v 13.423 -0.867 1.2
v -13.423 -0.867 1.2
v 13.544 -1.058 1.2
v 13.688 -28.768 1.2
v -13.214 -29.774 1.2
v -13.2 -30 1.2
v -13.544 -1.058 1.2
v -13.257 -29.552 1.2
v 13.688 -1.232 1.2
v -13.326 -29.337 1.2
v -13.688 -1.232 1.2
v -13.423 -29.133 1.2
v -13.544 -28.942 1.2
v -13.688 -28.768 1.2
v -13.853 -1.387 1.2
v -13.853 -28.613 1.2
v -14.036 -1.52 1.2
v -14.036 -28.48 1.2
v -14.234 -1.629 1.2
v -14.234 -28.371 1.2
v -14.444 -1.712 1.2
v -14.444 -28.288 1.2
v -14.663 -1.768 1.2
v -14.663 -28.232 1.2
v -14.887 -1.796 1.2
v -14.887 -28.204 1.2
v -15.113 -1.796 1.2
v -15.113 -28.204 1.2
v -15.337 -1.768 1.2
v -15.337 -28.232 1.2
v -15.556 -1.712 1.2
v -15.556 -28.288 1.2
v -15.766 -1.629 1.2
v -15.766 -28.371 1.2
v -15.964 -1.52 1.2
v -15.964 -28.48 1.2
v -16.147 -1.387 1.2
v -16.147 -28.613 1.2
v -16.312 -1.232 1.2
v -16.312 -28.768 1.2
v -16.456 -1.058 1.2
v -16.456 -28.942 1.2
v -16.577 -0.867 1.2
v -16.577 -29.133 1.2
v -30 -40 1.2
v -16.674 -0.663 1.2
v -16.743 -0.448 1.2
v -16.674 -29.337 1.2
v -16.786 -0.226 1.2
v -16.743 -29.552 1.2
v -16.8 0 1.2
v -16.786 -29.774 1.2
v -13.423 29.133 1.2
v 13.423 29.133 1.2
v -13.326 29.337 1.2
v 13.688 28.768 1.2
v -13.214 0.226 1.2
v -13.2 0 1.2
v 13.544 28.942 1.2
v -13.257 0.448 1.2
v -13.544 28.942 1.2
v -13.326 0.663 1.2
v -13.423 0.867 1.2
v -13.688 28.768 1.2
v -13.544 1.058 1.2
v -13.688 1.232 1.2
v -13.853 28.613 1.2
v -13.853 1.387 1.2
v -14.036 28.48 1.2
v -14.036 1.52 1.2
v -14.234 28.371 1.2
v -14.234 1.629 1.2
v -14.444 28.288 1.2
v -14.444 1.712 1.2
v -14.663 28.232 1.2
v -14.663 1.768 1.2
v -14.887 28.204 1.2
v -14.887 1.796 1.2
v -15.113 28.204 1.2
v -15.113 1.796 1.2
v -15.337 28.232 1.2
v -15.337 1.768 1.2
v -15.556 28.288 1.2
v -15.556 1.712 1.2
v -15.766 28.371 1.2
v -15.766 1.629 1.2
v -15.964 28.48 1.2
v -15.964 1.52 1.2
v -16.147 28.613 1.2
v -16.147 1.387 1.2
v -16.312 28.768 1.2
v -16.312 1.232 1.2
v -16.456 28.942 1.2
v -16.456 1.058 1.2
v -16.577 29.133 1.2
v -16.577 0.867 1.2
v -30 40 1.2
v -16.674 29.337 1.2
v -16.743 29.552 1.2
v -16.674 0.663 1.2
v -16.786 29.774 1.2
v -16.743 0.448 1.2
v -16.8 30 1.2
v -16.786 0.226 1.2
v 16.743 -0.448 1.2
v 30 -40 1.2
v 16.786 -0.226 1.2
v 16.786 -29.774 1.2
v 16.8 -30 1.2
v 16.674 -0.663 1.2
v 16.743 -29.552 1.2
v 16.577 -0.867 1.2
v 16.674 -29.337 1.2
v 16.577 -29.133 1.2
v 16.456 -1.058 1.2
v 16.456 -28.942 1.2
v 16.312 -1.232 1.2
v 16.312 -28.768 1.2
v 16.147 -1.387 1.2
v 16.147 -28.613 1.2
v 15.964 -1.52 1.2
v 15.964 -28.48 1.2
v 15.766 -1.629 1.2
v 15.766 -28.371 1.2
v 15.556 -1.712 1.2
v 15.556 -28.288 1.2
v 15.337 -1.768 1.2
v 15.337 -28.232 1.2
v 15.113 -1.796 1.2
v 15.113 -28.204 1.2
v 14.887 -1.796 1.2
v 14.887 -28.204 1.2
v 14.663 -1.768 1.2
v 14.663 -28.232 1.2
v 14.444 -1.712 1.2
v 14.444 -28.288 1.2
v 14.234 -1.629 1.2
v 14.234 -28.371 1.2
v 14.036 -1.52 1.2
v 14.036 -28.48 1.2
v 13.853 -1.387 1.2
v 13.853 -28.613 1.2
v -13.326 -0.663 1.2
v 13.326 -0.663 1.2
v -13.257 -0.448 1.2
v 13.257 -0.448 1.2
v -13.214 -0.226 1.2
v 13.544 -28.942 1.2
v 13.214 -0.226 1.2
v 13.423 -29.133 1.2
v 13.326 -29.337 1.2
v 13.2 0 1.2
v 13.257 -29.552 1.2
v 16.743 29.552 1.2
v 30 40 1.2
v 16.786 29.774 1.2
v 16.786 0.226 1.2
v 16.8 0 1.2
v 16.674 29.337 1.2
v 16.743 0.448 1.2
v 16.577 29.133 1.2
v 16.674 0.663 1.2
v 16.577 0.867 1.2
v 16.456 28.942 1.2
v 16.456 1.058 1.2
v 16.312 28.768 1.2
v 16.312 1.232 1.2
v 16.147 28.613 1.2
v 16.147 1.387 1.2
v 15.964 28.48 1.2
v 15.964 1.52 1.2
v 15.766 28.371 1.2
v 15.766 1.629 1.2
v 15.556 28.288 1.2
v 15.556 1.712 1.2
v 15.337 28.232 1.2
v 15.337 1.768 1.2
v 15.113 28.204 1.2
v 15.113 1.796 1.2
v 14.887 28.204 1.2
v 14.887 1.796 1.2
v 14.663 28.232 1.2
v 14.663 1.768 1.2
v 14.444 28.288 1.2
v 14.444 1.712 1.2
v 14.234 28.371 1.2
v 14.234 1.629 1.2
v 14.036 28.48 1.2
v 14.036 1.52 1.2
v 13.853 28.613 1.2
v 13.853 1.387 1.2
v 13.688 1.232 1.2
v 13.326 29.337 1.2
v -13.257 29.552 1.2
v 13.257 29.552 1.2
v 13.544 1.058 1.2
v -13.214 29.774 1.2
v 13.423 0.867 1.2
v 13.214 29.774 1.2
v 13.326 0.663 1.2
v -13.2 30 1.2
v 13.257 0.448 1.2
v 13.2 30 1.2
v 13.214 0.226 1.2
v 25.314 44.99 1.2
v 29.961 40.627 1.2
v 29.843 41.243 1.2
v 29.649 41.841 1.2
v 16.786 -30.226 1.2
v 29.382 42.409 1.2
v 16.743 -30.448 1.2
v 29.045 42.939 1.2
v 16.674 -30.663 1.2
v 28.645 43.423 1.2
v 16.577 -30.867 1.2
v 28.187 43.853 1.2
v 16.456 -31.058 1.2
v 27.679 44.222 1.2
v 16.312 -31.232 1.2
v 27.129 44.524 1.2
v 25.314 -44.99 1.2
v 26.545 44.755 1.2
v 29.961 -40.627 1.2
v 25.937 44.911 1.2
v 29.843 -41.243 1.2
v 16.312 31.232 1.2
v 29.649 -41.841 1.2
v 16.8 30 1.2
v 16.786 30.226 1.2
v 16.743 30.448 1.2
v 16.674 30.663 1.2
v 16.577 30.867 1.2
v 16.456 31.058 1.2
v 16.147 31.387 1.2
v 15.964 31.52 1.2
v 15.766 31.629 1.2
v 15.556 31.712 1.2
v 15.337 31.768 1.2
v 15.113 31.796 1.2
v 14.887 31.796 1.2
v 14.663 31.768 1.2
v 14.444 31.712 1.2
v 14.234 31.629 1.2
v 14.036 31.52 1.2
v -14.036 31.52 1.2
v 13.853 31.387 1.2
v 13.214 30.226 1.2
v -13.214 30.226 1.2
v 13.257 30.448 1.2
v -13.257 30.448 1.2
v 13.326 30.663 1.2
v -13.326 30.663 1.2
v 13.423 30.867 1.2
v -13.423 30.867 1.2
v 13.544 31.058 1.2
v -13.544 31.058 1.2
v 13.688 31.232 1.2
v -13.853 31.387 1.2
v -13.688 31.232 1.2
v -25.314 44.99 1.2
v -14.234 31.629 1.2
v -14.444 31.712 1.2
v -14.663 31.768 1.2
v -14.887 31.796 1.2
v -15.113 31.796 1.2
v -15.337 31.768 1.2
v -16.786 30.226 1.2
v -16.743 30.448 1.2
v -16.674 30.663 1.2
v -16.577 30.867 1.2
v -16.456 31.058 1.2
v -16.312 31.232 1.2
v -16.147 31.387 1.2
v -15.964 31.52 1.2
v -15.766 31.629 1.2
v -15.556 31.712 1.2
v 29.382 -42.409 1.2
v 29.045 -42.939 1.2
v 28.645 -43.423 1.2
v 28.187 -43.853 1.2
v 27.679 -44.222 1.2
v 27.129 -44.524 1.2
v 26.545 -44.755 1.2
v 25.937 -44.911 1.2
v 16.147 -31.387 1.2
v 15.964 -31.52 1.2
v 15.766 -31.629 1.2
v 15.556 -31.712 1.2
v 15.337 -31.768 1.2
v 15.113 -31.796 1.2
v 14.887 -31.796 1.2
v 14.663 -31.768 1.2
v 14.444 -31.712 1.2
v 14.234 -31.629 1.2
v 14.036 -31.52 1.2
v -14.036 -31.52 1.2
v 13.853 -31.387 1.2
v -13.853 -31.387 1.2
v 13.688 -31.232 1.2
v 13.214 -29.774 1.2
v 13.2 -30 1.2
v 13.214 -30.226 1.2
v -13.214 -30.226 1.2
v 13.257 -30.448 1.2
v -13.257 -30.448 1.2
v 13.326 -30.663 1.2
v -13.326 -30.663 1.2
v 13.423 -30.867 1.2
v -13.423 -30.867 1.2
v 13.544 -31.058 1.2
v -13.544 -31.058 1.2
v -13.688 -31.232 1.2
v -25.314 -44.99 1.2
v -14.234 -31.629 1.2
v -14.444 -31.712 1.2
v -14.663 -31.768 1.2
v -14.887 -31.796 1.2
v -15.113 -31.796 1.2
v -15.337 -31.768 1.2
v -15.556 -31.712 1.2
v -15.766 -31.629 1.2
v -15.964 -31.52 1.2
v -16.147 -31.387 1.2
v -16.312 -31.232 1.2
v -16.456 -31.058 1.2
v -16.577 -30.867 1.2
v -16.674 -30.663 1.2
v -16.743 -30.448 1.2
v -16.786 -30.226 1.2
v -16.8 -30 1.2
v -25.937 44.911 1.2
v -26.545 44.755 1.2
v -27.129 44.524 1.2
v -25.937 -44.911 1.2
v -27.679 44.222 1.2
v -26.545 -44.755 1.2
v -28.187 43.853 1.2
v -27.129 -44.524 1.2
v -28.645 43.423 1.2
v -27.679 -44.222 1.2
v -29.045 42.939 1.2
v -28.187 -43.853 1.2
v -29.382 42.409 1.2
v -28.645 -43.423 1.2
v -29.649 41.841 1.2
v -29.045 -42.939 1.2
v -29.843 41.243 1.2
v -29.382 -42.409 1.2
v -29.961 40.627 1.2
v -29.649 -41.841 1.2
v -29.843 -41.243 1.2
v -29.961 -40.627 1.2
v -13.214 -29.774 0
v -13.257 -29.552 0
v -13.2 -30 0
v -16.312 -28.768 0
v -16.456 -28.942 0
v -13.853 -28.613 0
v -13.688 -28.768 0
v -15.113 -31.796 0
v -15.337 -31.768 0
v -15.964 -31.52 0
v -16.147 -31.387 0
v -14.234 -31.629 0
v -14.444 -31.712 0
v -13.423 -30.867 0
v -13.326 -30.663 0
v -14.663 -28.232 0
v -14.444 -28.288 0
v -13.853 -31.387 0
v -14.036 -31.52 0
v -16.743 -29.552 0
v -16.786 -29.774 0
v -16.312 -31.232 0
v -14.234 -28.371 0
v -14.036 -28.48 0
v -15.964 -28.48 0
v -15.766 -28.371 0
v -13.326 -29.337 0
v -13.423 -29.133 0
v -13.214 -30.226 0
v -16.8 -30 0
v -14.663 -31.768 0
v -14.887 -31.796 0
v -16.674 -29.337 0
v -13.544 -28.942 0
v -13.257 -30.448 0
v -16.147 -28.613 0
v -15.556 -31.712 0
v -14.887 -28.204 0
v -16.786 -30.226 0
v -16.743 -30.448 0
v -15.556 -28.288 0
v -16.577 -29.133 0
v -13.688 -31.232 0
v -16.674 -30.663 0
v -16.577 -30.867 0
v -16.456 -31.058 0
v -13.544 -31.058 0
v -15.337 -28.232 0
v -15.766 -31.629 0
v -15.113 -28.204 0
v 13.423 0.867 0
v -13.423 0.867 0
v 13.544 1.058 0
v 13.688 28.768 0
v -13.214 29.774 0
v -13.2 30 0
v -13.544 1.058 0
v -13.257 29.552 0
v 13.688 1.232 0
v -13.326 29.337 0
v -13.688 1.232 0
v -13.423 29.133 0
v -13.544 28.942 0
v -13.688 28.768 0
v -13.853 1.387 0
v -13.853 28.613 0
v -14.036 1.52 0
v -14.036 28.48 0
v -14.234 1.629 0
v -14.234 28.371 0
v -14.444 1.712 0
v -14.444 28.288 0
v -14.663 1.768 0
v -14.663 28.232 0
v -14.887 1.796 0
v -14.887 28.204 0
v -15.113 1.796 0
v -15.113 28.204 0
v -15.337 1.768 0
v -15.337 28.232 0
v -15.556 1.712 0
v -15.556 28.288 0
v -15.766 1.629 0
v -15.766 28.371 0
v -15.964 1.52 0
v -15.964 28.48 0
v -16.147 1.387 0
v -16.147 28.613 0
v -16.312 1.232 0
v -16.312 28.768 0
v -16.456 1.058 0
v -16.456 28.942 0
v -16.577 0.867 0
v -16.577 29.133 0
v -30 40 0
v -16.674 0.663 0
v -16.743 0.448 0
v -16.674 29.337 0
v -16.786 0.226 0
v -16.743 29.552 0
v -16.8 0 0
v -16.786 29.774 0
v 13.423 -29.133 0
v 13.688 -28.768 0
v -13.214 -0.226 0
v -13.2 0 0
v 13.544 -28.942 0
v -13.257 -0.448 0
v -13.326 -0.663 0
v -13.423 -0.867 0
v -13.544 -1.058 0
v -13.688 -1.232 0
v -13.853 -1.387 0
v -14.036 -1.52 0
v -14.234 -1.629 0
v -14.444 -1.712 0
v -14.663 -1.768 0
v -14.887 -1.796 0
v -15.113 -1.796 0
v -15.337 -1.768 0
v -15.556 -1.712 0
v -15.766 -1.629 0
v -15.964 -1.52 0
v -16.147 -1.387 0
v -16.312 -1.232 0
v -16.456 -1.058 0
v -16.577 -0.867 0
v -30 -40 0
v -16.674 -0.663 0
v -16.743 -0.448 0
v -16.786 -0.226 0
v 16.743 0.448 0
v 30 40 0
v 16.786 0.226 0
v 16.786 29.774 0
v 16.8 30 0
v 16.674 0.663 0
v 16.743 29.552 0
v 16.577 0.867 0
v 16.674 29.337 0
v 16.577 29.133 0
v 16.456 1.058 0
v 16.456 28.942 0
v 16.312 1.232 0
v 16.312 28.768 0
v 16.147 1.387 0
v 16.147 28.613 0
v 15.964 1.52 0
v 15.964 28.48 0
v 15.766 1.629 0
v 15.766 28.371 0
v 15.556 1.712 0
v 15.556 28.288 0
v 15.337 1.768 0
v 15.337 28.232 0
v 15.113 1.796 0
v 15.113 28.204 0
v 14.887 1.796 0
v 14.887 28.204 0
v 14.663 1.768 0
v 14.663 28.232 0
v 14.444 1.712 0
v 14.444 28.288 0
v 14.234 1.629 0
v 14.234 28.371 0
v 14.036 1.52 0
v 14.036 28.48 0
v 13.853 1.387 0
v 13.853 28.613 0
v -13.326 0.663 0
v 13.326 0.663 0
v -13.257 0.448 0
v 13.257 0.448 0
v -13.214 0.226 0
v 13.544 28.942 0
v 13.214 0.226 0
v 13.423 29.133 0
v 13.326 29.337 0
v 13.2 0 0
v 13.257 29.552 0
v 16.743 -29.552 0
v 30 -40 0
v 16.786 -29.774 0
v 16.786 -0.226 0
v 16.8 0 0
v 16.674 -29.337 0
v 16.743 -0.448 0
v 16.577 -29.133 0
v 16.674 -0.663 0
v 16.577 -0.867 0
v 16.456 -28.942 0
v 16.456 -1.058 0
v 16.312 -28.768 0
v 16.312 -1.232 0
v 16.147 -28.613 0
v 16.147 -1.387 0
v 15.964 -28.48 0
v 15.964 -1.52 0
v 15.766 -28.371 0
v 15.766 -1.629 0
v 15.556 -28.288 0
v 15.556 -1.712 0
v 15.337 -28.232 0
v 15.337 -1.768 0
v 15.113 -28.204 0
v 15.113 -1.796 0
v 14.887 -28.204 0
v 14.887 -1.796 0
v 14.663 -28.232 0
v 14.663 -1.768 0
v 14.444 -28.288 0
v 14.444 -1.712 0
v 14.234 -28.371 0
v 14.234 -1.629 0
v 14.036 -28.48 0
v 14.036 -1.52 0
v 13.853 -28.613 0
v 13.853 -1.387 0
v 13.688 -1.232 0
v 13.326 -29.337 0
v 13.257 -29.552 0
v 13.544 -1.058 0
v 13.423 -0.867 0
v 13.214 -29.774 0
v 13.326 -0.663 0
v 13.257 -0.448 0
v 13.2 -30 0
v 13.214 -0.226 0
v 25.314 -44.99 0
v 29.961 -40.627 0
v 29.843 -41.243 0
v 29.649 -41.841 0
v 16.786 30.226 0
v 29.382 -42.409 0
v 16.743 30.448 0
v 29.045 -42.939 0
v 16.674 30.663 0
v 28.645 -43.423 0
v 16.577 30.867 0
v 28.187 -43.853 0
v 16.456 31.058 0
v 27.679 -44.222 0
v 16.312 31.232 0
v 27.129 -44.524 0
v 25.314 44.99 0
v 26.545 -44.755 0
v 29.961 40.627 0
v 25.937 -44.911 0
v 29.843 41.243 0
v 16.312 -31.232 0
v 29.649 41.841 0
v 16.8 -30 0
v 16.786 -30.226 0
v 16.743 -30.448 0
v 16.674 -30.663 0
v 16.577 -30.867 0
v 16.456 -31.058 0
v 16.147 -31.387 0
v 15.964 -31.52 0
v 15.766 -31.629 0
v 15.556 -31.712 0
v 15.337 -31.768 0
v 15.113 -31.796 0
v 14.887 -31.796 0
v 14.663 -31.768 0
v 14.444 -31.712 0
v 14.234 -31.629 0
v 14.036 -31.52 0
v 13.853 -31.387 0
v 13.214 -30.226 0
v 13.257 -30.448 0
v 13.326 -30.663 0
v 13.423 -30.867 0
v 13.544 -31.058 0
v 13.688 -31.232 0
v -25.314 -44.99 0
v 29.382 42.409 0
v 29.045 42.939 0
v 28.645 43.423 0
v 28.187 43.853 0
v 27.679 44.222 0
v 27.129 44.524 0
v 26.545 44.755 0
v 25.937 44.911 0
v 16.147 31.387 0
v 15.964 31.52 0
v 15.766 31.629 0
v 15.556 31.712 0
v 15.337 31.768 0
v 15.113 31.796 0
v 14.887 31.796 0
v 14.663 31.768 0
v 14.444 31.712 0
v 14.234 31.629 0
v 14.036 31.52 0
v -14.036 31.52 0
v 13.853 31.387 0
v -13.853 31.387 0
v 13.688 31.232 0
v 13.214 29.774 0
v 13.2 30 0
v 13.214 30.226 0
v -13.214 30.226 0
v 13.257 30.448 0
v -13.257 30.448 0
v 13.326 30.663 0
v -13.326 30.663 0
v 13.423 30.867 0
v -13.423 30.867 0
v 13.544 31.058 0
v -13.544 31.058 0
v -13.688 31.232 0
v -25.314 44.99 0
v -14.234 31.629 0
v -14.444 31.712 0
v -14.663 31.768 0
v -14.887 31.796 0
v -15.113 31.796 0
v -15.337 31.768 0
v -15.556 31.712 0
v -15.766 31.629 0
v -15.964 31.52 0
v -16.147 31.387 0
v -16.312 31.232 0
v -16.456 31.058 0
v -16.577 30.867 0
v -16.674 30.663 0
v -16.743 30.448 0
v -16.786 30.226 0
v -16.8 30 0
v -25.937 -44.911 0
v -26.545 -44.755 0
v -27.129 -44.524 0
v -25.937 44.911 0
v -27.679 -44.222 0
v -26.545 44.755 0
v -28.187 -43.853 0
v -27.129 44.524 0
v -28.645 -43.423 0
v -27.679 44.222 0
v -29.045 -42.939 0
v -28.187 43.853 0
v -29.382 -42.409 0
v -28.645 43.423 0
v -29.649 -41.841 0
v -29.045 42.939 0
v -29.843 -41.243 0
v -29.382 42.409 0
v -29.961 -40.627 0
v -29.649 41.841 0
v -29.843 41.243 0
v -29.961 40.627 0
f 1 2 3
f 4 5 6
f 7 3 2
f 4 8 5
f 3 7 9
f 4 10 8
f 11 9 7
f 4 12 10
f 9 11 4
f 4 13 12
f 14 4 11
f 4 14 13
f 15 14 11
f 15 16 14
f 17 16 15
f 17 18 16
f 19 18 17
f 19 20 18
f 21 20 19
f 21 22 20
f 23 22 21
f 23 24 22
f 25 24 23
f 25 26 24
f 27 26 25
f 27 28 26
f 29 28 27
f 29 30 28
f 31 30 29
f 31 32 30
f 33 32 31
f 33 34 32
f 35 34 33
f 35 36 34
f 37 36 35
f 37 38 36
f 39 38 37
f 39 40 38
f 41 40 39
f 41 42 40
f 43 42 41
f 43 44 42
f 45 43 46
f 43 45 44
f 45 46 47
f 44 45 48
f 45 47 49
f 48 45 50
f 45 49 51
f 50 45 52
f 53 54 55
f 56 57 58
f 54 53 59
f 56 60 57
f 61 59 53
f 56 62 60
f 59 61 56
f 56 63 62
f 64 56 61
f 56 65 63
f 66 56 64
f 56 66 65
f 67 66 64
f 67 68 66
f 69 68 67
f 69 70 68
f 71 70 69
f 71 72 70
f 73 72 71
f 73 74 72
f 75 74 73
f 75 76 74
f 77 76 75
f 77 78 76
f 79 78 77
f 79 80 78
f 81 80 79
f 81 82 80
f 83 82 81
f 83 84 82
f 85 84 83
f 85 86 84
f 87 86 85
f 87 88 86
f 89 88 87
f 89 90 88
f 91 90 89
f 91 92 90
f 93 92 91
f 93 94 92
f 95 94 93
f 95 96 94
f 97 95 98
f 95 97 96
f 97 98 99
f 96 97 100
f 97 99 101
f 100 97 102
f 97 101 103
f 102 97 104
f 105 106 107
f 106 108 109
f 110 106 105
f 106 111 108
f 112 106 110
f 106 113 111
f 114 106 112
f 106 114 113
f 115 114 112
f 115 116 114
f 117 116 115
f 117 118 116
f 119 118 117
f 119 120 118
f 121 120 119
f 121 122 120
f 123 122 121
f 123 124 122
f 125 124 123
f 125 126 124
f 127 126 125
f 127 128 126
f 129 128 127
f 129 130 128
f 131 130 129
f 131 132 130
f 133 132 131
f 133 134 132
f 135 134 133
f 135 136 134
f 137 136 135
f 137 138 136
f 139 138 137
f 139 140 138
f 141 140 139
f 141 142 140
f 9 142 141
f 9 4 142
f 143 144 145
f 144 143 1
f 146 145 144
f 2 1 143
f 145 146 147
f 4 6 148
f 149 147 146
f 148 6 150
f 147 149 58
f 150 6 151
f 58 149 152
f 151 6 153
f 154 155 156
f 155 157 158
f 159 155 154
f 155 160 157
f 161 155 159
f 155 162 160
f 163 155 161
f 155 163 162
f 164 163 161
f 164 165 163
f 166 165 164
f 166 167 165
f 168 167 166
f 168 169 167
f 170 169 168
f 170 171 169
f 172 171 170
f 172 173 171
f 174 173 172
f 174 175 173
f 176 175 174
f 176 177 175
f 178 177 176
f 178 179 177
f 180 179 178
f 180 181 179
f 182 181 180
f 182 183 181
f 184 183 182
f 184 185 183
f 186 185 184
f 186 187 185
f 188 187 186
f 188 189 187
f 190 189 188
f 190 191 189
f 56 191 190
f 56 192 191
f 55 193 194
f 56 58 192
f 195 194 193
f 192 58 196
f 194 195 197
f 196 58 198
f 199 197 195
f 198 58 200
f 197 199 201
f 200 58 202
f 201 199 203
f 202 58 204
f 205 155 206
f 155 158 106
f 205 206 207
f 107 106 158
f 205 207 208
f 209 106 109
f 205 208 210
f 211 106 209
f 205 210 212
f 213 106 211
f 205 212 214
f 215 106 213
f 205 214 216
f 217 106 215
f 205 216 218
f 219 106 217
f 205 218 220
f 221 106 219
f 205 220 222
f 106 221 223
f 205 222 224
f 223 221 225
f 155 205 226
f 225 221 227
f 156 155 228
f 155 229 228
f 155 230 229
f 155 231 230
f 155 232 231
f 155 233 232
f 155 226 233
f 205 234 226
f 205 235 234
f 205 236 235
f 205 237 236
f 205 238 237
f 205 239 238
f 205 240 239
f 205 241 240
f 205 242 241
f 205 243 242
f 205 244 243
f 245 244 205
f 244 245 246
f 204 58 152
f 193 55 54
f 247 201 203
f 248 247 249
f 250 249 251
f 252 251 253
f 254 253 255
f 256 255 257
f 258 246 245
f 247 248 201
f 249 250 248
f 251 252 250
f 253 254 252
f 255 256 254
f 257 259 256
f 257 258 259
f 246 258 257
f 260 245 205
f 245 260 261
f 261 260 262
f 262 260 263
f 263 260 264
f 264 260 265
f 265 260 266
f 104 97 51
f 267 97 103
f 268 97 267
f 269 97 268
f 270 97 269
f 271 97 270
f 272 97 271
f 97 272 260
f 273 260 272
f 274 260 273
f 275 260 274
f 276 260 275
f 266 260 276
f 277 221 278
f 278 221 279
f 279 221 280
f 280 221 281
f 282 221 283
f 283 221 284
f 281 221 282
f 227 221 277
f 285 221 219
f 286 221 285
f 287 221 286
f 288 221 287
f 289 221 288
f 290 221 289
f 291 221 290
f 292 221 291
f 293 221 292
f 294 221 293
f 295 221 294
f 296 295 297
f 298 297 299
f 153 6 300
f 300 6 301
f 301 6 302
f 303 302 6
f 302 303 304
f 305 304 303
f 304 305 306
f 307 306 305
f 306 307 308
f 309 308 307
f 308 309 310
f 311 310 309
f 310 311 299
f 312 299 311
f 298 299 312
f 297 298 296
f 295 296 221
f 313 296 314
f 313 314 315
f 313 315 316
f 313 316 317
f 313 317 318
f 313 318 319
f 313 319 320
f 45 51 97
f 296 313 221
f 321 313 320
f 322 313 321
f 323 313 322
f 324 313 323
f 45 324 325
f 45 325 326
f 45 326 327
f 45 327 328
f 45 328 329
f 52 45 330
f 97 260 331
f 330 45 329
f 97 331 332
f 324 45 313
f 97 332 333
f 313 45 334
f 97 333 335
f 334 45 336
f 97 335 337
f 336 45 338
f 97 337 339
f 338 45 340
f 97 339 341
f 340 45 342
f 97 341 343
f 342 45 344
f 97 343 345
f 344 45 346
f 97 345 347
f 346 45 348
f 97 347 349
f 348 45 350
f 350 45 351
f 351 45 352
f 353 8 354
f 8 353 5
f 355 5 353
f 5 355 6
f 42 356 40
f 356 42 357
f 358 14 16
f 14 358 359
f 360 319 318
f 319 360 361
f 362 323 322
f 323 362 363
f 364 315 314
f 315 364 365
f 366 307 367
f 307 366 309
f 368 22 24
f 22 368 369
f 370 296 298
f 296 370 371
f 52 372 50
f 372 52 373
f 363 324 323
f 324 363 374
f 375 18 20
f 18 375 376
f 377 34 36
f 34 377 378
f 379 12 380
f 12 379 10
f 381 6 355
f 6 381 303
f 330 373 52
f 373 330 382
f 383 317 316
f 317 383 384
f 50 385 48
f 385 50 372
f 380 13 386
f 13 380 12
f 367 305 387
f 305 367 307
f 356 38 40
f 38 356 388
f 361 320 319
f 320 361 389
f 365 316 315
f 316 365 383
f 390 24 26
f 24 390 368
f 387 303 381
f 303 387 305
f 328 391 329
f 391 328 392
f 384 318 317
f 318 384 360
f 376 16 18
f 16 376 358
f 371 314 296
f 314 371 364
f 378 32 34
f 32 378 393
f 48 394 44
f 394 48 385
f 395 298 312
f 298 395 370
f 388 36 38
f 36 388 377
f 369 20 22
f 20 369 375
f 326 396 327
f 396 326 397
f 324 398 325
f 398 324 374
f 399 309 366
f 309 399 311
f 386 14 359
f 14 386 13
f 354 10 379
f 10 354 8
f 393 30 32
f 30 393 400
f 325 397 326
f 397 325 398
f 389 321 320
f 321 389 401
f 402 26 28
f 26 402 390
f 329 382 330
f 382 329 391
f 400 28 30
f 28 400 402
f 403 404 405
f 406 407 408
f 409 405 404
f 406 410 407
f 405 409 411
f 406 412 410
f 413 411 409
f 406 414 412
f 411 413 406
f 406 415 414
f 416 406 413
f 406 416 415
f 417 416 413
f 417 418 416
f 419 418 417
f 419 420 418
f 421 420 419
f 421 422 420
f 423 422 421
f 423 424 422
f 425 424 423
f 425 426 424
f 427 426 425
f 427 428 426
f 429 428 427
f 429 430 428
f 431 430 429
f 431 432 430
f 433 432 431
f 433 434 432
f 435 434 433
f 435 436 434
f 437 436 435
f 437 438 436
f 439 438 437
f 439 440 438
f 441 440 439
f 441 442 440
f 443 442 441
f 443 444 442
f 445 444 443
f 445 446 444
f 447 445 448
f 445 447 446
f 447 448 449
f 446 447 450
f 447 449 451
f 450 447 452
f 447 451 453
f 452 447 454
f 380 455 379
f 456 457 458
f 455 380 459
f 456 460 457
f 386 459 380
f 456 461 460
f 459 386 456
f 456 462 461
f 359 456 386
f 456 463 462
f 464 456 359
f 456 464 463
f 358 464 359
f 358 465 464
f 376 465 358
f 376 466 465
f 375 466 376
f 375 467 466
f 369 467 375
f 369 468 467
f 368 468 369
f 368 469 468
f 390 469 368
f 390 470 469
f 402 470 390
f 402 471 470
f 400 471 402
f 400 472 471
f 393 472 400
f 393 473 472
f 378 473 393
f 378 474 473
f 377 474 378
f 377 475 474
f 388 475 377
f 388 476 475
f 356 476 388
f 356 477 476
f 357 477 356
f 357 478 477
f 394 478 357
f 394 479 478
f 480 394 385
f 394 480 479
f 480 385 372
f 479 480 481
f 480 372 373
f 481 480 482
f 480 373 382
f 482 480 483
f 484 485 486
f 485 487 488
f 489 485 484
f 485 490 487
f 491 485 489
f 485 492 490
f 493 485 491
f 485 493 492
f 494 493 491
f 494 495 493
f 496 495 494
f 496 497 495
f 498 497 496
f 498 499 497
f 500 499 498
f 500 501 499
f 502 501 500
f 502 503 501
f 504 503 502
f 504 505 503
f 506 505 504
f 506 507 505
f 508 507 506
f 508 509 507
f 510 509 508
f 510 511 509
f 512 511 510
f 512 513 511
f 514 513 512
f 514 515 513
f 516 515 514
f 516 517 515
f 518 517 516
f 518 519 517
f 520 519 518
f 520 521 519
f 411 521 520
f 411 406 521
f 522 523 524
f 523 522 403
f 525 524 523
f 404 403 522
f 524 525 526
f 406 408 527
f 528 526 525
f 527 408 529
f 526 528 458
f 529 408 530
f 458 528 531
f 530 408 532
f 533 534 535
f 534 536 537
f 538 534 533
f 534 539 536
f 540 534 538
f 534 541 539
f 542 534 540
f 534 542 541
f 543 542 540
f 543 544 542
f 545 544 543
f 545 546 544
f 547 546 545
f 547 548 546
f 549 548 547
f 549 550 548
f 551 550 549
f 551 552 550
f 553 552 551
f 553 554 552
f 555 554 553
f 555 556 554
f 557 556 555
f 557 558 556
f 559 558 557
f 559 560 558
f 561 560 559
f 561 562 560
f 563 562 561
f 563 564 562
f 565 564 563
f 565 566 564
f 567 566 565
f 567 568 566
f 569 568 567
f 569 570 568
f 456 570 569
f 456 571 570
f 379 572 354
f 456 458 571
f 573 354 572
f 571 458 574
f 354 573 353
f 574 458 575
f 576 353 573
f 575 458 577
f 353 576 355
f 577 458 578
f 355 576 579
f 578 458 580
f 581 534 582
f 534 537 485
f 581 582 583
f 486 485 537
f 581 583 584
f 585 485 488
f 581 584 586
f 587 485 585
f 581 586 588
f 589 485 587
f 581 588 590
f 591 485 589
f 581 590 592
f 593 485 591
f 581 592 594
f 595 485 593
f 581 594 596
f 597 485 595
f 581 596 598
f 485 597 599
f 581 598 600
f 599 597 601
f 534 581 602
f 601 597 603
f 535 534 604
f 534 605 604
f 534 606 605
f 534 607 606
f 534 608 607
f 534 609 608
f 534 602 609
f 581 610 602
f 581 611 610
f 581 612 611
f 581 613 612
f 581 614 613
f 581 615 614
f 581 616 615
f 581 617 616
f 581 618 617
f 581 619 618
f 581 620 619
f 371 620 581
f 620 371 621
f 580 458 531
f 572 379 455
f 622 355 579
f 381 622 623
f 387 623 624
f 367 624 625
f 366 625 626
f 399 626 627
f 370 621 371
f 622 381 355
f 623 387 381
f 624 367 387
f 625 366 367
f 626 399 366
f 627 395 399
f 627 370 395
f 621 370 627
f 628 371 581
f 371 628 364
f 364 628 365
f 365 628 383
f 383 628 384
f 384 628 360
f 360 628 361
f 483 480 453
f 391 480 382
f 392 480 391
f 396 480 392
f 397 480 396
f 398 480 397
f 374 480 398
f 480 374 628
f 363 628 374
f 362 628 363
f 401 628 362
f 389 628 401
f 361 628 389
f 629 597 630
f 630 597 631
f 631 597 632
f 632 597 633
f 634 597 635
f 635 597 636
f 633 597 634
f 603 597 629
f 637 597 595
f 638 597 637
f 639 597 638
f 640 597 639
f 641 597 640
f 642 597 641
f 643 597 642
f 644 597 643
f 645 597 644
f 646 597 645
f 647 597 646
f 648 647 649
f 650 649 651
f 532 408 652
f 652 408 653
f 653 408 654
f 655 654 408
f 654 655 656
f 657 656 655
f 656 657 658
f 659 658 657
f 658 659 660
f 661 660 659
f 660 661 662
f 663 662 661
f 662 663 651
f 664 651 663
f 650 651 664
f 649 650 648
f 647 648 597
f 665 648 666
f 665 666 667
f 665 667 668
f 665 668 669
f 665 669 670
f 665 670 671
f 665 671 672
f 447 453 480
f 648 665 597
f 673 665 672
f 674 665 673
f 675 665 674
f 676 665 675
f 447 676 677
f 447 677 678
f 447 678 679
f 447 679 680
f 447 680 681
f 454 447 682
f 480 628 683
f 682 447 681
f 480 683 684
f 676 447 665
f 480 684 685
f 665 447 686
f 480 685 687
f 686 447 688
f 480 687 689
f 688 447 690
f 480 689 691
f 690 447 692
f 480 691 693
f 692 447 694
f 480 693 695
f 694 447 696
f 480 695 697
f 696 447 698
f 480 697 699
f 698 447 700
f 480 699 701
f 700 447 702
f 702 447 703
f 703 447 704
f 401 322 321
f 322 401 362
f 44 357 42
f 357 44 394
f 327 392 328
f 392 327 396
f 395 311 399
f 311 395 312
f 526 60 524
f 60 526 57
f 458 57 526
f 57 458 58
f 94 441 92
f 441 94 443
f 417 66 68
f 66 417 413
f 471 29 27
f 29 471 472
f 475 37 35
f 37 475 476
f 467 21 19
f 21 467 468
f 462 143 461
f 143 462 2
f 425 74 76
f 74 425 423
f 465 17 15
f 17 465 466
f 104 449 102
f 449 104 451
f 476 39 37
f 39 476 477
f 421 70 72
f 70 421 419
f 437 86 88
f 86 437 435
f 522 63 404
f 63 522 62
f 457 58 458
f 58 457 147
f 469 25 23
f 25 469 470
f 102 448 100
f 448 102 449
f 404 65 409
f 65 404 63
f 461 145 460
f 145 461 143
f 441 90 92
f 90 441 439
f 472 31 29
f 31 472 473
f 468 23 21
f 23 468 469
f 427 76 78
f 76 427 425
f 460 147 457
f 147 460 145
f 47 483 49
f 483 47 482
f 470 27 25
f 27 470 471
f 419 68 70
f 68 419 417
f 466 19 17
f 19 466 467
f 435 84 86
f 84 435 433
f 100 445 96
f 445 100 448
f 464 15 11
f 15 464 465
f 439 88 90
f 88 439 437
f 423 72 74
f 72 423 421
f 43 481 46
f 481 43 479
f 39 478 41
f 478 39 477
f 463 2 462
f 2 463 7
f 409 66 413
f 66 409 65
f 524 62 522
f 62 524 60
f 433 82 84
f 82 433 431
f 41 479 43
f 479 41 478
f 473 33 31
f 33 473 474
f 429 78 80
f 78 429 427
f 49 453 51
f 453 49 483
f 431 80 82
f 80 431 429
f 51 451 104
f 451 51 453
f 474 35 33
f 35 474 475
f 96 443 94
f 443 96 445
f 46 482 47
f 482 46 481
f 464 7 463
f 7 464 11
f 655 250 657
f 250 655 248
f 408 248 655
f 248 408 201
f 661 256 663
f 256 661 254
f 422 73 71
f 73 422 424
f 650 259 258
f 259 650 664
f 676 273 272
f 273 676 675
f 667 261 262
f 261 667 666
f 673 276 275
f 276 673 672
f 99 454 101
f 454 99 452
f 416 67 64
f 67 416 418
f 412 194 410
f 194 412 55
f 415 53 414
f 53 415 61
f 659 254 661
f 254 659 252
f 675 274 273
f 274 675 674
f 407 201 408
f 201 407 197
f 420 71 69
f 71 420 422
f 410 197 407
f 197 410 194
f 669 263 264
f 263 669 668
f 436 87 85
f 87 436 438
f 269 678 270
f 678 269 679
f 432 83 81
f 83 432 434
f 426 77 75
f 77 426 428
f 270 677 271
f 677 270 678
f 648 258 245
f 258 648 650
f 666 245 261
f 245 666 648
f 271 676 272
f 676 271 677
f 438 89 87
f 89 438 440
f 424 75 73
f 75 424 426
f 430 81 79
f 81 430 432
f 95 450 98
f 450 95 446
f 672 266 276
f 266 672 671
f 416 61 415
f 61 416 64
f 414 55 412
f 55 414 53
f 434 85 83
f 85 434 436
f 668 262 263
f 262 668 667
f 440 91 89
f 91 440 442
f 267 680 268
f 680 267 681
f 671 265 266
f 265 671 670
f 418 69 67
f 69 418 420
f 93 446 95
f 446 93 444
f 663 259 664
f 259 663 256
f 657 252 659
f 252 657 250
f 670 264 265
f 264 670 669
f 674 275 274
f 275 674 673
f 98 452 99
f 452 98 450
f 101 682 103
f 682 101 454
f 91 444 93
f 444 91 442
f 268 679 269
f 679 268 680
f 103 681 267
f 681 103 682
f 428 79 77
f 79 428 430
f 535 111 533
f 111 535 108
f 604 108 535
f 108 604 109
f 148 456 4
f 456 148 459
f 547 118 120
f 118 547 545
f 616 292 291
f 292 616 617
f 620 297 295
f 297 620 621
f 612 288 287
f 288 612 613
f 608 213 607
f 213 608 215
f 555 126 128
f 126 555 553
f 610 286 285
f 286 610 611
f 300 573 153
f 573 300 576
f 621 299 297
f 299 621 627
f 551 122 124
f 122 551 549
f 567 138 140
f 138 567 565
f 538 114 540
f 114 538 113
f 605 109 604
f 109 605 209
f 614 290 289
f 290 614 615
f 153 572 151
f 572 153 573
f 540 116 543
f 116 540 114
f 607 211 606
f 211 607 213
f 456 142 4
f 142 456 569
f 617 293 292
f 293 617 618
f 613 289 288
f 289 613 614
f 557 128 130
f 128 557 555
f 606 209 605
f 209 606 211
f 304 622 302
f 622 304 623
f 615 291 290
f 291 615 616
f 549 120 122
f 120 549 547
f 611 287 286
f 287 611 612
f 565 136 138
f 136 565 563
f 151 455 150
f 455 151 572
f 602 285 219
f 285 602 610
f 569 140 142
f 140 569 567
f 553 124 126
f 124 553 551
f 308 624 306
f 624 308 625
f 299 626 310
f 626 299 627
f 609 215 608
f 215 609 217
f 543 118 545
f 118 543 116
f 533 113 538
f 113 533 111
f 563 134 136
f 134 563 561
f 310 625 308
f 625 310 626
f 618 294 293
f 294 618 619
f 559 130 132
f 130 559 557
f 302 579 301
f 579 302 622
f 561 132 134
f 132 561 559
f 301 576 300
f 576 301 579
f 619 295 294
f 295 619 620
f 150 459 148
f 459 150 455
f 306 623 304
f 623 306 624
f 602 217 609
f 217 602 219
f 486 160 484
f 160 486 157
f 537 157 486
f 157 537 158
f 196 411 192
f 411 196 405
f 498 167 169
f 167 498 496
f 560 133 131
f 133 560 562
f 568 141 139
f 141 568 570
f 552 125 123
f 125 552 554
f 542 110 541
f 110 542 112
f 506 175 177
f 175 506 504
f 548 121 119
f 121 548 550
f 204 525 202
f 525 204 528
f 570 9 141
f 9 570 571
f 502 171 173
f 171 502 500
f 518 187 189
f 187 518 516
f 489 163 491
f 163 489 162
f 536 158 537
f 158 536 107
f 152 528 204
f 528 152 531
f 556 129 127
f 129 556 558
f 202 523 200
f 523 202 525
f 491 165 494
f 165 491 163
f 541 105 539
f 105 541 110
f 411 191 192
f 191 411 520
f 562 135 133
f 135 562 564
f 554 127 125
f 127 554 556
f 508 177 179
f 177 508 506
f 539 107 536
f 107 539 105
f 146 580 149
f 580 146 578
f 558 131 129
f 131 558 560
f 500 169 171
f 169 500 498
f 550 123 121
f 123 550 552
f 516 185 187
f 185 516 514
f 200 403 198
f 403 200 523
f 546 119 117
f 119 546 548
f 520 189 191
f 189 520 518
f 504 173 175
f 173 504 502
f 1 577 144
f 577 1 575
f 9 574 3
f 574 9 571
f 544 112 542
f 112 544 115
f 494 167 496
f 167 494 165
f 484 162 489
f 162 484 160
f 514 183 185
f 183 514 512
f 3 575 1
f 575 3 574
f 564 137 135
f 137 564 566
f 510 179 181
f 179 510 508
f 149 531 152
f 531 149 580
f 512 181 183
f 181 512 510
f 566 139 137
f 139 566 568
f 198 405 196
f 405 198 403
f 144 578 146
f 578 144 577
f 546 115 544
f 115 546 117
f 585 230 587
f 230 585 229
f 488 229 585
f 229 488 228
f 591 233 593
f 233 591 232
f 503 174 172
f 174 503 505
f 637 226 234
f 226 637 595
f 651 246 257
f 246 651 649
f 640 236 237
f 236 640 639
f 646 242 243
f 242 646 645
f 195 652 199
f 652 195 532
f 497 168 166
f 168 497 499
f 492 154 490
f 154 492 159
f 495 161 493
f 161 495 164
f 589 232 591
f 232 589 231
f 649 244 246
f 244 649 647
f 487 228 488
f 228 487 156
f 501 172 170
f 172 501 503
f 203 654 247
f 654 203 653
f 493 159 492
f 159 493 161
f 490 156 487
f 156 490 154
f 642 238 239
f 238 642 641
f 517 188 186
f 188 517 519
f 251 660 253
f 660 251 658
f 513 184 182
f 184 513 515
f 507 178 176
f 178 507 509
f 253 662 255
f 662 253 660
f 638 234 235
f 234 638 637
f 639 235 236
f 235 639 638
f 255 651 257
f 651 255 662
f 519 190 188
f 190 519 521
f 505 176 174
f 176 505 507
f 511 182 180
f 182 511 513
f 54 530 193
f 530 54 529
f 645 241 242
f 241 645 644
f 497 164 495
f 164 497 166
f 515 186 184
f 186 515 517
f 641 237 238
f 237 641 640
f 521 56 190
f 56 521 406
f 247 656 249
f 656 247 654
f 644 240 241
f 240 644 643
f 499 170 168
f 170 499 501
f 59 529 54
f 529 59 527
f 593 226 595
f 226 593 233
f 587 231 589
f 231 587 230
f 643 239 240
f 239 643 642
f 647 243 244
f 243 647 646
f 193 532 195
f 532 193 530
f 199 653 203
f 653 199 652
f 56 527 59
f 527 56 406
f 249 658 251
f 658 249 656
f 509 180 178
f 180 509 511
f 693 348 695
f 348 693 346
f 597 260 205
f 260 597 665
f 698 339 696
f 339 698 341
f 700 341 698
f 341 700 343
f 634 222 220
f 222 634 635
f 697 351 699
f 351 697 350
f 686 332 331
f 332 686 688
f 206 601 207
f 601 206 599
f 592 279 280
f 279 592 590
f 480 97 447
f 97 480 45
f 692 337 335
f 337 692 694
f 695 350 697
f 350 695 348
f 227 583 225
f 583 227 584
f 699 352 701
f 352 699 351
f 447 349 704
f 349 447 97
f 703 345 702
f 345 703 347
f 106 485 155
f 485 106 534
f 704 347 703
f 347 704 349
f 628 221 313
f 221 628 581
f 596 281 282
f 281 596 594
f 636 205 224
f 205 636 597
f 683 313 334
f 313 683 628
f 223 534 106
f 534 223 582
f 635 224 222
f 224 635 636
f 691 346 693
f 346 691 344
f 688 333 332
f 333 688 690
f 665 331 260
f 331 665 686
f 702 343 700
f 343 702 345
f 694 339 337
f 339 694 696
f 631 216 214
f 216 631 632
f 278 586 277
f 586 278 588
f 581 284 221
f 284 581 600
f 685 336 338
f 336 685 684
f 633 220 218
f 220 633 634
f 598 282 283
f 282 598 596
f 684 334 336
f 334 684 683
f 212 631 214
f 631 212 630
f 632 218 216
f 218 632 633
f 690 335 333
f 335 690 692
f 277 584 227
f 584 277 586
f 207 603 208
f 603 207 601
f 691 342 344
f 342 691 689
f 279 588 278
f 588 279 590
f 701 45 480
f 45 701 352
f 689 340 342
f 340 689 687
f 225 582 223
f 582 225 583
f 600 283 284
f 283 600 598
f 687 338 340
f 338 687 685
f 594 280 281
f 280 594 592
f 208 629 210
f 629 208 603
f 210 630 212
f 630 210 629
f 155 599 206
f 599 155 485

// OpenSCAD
$fn = 50;


difference() {
	union() {
		hull() {
			translate(v = [-25.0000000000, 40.0000000000, 0]) {
				cylinder(h = 45, r = 5);
			}
			translate(v = [25.0000000000, 40.0000000000, 0]) {
				cylinder(h = 45, r = 5);
			}
			translate(v = [-25.0000000000, -40.0000000000, 0]) {
				cylinder(h = 45, r = 5);
			}
			translate(v = [25.0000000000, -40.0000000000, 0]) {
				cylinder(h = 45, r = 5);
			}
		}
	}
	union() {
		translate(v = [0, 0, 1.2000000000]) {
			hull() {
				translate(v = [-25.0000000000, 40.0000000000, 0]) {
					cylinder(h = 43.8000000000, r = 3.8000000000);
				}
				translate(v = [25.0000000000, 40.0000000000, 0]) {
					cylinder(h = 43.8000000000, r = 3.8000000000);
				}
				translate(v = [-25.0000000000, -40.0000000000, 0]) {
					cylinder(h = 43.8000000000, r = 3.8000000000);
				}
				translate(v = [25.0000000000, -40.0000000000, 0]) {
					cylinder(h = 43.8000000000, r = 3.8000000000);
				}
			}
		}
		#translate(v = [-15.0000000000, -30.0000000000, 0]) {
			cylinder(h = 1.2000000000, r = 1.8000000000);
		}
		#translate(v = [-15.0000000000, 0.0000000000, 0]) {
			cylinder(h = 1.2000000000, r = 1.8000000000);
		}
		#translate(v = [-15.0000000000, 30.0000000000, 0]) {
			cylinder(h = 1.2000000000, r = 1.8000000000);
		}
		#translate(v = [15.0000000000, -30.0000000000, 0]) {
			cylinder(h = 1.2000000000, r = 1.8000000000);
		}
		#translate(v = [15.0000000000, 0.0000000000, 0]) {
			cylinder(h = 1.2000000000, r = 1.8000000000);
		}
		#translate(v = [15.0000000000, 30.0000000000, 0]) {
			cylinder(h = 1.2000000000, r = 1.8000000000);
		}
		translate(v = [-250.0000000000, -250.0000000000, 1.2000000000]) {
			cube(size = [500, 500, 500]);
		}
		translate(v = [-250.0000000000, -250.0000000000, 1.2000000000]) {
			cube(size = [500, 500, 500]);
		}
		translate(v = [-250.0000000000, -250.0000000000, 1.2000000000]) {
			cube(size = [500, 500, 500]);
		}
	}
}
